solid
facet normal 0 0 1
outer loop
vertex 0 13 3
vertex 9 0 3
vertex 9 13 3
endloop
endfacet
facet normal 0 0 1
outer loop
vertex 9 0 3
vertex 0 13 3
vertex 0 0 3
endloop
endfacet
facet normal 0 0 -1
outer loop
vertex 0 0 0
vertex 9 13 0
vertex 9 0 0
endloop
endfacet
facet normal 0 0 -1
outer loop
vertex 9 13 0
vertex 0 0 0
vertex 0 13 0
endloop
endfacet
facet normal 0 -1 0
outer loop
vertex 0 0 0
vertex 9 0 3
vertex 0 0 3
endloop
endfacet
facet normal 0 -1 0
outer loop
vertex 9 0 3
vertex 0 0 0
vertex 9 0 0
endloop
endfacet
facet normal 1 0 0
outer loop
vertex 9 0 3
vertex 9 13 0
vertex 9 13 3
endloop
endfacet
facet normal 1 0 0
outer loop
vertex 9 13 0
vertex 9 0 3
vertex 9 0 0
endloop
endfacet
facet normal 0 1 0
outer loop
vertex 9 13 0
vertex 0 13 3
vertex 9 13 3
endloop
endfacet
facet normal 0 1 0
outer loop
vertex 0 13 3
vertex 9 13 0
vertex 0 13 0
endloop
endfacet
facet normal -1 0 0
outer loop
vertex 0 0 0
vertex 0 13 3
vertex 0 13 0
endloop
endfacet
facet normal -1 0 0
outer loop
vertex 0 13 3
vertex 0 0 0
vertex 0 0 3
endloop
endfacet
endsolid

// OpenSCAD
// Generated by SolidPython 1.0.1 on 2020-07-29 00:46:55


cube(size = [9, 13, 3]);
/***********************************************
*********      SolidPython code:      **********
************************************************
 
# import packages: SolidPython
from solid import *
from solid.utils import *
from itertools import chain, combinations, permutations


class Resize:

    def __init__(self, scad_file):
        self.scad_file = scad_file
        #self.scad_file = import_scad(scad_file)
        # cone/cylinder param:
        self.r1 = 0
        self.r2 = 0
        self.h = 0
        # rectangular prism param:
        self.w = 0
        self.l = 0
        # ellipse param:
        self.r = 0

    # import OpenScad code (file name corresponds to shape)


    # classify shape + parameters
    def assign(self, param1, param2, param3):
        if self.scad_file == 'cone.scad':
            self.r1 = param1
            self.r2 = param2
            self.h = param3
        elif self.scad_file == 'cylinder.scad':
            self.r1 = param1
            self.r2 = param2
            self.h = param3
        elif self.scad_file == 'rectangularPrism.scad':
            self.h = param1
            self.l = param2
            self.w = param3
        else:
            self.r = param1
            self.h = param2

    # resize parameters
    def iterate(self):
        x = range(3, 20, 2)
        i = 1
        if self.scad_file == 'cone.scad':
            tempList = list(permutations(x, 2))
            for temp in tempList:
                param1 = temp[0]
                param2 = temp[1]
                filepath = 'produced_scad_files/' + 'cone' + str(param1) + '_' + str(param2) + '_' + '.scad'
                scad_render_to_file(cylinder(h=param1, r1=param2, r2=0), filepath)

        elif self.scad_file == 'cylinder.scad':
            tempList = list(permutations(x, 3))
            for temp in tempList:
                param1 = temp[0]
                param2 = temp[1]
                filepath = 'produced_scad_files/' + 'cylinder' + str(param1) + '_' + str(param2) + '_' + '.scad'
                scad_render_to_file(cylinder(h=param1, r1=param2, r2=param2), filepath)

        elif self.scad_file == 'rectangularPrism.scad':
            tempList = list(permutations(x, 3))
            for temp in tempList:
                param1 = temp[0]
                param2 = temp[1]
                param3 = temp[2]
                filepath = 'produced_scad_files/' + 'rectangularPrism' + str(param1) + '_' + str(param2) + '_' + str(
                    param3) + '.scad'
                scad_render_to_file(cube(size=(param1, param2, param3)), filepath)

        elif self.scad_file == 'ellipse.scad':
            tempList = list(permutations(x, 4))
            for temp in tempList:
                param1 = temp[0]
                param2 = temp[1]
                param3 = temp[2]
                param4 = temp[3]
                filepath = 'produced_scad_files/' + 'ellipse' + str(param1) + '_' + str(param2) + '_' + str(param3) + '_' + str(param4) + '.scad'
                scad_render_to_file(scale([param1, param2, param3])(sphere(r=param4)), filepath)

    def render_to_scadfile(self):
        scad_render_to_file(scad, 'example.scad') 
 
************************************************/
